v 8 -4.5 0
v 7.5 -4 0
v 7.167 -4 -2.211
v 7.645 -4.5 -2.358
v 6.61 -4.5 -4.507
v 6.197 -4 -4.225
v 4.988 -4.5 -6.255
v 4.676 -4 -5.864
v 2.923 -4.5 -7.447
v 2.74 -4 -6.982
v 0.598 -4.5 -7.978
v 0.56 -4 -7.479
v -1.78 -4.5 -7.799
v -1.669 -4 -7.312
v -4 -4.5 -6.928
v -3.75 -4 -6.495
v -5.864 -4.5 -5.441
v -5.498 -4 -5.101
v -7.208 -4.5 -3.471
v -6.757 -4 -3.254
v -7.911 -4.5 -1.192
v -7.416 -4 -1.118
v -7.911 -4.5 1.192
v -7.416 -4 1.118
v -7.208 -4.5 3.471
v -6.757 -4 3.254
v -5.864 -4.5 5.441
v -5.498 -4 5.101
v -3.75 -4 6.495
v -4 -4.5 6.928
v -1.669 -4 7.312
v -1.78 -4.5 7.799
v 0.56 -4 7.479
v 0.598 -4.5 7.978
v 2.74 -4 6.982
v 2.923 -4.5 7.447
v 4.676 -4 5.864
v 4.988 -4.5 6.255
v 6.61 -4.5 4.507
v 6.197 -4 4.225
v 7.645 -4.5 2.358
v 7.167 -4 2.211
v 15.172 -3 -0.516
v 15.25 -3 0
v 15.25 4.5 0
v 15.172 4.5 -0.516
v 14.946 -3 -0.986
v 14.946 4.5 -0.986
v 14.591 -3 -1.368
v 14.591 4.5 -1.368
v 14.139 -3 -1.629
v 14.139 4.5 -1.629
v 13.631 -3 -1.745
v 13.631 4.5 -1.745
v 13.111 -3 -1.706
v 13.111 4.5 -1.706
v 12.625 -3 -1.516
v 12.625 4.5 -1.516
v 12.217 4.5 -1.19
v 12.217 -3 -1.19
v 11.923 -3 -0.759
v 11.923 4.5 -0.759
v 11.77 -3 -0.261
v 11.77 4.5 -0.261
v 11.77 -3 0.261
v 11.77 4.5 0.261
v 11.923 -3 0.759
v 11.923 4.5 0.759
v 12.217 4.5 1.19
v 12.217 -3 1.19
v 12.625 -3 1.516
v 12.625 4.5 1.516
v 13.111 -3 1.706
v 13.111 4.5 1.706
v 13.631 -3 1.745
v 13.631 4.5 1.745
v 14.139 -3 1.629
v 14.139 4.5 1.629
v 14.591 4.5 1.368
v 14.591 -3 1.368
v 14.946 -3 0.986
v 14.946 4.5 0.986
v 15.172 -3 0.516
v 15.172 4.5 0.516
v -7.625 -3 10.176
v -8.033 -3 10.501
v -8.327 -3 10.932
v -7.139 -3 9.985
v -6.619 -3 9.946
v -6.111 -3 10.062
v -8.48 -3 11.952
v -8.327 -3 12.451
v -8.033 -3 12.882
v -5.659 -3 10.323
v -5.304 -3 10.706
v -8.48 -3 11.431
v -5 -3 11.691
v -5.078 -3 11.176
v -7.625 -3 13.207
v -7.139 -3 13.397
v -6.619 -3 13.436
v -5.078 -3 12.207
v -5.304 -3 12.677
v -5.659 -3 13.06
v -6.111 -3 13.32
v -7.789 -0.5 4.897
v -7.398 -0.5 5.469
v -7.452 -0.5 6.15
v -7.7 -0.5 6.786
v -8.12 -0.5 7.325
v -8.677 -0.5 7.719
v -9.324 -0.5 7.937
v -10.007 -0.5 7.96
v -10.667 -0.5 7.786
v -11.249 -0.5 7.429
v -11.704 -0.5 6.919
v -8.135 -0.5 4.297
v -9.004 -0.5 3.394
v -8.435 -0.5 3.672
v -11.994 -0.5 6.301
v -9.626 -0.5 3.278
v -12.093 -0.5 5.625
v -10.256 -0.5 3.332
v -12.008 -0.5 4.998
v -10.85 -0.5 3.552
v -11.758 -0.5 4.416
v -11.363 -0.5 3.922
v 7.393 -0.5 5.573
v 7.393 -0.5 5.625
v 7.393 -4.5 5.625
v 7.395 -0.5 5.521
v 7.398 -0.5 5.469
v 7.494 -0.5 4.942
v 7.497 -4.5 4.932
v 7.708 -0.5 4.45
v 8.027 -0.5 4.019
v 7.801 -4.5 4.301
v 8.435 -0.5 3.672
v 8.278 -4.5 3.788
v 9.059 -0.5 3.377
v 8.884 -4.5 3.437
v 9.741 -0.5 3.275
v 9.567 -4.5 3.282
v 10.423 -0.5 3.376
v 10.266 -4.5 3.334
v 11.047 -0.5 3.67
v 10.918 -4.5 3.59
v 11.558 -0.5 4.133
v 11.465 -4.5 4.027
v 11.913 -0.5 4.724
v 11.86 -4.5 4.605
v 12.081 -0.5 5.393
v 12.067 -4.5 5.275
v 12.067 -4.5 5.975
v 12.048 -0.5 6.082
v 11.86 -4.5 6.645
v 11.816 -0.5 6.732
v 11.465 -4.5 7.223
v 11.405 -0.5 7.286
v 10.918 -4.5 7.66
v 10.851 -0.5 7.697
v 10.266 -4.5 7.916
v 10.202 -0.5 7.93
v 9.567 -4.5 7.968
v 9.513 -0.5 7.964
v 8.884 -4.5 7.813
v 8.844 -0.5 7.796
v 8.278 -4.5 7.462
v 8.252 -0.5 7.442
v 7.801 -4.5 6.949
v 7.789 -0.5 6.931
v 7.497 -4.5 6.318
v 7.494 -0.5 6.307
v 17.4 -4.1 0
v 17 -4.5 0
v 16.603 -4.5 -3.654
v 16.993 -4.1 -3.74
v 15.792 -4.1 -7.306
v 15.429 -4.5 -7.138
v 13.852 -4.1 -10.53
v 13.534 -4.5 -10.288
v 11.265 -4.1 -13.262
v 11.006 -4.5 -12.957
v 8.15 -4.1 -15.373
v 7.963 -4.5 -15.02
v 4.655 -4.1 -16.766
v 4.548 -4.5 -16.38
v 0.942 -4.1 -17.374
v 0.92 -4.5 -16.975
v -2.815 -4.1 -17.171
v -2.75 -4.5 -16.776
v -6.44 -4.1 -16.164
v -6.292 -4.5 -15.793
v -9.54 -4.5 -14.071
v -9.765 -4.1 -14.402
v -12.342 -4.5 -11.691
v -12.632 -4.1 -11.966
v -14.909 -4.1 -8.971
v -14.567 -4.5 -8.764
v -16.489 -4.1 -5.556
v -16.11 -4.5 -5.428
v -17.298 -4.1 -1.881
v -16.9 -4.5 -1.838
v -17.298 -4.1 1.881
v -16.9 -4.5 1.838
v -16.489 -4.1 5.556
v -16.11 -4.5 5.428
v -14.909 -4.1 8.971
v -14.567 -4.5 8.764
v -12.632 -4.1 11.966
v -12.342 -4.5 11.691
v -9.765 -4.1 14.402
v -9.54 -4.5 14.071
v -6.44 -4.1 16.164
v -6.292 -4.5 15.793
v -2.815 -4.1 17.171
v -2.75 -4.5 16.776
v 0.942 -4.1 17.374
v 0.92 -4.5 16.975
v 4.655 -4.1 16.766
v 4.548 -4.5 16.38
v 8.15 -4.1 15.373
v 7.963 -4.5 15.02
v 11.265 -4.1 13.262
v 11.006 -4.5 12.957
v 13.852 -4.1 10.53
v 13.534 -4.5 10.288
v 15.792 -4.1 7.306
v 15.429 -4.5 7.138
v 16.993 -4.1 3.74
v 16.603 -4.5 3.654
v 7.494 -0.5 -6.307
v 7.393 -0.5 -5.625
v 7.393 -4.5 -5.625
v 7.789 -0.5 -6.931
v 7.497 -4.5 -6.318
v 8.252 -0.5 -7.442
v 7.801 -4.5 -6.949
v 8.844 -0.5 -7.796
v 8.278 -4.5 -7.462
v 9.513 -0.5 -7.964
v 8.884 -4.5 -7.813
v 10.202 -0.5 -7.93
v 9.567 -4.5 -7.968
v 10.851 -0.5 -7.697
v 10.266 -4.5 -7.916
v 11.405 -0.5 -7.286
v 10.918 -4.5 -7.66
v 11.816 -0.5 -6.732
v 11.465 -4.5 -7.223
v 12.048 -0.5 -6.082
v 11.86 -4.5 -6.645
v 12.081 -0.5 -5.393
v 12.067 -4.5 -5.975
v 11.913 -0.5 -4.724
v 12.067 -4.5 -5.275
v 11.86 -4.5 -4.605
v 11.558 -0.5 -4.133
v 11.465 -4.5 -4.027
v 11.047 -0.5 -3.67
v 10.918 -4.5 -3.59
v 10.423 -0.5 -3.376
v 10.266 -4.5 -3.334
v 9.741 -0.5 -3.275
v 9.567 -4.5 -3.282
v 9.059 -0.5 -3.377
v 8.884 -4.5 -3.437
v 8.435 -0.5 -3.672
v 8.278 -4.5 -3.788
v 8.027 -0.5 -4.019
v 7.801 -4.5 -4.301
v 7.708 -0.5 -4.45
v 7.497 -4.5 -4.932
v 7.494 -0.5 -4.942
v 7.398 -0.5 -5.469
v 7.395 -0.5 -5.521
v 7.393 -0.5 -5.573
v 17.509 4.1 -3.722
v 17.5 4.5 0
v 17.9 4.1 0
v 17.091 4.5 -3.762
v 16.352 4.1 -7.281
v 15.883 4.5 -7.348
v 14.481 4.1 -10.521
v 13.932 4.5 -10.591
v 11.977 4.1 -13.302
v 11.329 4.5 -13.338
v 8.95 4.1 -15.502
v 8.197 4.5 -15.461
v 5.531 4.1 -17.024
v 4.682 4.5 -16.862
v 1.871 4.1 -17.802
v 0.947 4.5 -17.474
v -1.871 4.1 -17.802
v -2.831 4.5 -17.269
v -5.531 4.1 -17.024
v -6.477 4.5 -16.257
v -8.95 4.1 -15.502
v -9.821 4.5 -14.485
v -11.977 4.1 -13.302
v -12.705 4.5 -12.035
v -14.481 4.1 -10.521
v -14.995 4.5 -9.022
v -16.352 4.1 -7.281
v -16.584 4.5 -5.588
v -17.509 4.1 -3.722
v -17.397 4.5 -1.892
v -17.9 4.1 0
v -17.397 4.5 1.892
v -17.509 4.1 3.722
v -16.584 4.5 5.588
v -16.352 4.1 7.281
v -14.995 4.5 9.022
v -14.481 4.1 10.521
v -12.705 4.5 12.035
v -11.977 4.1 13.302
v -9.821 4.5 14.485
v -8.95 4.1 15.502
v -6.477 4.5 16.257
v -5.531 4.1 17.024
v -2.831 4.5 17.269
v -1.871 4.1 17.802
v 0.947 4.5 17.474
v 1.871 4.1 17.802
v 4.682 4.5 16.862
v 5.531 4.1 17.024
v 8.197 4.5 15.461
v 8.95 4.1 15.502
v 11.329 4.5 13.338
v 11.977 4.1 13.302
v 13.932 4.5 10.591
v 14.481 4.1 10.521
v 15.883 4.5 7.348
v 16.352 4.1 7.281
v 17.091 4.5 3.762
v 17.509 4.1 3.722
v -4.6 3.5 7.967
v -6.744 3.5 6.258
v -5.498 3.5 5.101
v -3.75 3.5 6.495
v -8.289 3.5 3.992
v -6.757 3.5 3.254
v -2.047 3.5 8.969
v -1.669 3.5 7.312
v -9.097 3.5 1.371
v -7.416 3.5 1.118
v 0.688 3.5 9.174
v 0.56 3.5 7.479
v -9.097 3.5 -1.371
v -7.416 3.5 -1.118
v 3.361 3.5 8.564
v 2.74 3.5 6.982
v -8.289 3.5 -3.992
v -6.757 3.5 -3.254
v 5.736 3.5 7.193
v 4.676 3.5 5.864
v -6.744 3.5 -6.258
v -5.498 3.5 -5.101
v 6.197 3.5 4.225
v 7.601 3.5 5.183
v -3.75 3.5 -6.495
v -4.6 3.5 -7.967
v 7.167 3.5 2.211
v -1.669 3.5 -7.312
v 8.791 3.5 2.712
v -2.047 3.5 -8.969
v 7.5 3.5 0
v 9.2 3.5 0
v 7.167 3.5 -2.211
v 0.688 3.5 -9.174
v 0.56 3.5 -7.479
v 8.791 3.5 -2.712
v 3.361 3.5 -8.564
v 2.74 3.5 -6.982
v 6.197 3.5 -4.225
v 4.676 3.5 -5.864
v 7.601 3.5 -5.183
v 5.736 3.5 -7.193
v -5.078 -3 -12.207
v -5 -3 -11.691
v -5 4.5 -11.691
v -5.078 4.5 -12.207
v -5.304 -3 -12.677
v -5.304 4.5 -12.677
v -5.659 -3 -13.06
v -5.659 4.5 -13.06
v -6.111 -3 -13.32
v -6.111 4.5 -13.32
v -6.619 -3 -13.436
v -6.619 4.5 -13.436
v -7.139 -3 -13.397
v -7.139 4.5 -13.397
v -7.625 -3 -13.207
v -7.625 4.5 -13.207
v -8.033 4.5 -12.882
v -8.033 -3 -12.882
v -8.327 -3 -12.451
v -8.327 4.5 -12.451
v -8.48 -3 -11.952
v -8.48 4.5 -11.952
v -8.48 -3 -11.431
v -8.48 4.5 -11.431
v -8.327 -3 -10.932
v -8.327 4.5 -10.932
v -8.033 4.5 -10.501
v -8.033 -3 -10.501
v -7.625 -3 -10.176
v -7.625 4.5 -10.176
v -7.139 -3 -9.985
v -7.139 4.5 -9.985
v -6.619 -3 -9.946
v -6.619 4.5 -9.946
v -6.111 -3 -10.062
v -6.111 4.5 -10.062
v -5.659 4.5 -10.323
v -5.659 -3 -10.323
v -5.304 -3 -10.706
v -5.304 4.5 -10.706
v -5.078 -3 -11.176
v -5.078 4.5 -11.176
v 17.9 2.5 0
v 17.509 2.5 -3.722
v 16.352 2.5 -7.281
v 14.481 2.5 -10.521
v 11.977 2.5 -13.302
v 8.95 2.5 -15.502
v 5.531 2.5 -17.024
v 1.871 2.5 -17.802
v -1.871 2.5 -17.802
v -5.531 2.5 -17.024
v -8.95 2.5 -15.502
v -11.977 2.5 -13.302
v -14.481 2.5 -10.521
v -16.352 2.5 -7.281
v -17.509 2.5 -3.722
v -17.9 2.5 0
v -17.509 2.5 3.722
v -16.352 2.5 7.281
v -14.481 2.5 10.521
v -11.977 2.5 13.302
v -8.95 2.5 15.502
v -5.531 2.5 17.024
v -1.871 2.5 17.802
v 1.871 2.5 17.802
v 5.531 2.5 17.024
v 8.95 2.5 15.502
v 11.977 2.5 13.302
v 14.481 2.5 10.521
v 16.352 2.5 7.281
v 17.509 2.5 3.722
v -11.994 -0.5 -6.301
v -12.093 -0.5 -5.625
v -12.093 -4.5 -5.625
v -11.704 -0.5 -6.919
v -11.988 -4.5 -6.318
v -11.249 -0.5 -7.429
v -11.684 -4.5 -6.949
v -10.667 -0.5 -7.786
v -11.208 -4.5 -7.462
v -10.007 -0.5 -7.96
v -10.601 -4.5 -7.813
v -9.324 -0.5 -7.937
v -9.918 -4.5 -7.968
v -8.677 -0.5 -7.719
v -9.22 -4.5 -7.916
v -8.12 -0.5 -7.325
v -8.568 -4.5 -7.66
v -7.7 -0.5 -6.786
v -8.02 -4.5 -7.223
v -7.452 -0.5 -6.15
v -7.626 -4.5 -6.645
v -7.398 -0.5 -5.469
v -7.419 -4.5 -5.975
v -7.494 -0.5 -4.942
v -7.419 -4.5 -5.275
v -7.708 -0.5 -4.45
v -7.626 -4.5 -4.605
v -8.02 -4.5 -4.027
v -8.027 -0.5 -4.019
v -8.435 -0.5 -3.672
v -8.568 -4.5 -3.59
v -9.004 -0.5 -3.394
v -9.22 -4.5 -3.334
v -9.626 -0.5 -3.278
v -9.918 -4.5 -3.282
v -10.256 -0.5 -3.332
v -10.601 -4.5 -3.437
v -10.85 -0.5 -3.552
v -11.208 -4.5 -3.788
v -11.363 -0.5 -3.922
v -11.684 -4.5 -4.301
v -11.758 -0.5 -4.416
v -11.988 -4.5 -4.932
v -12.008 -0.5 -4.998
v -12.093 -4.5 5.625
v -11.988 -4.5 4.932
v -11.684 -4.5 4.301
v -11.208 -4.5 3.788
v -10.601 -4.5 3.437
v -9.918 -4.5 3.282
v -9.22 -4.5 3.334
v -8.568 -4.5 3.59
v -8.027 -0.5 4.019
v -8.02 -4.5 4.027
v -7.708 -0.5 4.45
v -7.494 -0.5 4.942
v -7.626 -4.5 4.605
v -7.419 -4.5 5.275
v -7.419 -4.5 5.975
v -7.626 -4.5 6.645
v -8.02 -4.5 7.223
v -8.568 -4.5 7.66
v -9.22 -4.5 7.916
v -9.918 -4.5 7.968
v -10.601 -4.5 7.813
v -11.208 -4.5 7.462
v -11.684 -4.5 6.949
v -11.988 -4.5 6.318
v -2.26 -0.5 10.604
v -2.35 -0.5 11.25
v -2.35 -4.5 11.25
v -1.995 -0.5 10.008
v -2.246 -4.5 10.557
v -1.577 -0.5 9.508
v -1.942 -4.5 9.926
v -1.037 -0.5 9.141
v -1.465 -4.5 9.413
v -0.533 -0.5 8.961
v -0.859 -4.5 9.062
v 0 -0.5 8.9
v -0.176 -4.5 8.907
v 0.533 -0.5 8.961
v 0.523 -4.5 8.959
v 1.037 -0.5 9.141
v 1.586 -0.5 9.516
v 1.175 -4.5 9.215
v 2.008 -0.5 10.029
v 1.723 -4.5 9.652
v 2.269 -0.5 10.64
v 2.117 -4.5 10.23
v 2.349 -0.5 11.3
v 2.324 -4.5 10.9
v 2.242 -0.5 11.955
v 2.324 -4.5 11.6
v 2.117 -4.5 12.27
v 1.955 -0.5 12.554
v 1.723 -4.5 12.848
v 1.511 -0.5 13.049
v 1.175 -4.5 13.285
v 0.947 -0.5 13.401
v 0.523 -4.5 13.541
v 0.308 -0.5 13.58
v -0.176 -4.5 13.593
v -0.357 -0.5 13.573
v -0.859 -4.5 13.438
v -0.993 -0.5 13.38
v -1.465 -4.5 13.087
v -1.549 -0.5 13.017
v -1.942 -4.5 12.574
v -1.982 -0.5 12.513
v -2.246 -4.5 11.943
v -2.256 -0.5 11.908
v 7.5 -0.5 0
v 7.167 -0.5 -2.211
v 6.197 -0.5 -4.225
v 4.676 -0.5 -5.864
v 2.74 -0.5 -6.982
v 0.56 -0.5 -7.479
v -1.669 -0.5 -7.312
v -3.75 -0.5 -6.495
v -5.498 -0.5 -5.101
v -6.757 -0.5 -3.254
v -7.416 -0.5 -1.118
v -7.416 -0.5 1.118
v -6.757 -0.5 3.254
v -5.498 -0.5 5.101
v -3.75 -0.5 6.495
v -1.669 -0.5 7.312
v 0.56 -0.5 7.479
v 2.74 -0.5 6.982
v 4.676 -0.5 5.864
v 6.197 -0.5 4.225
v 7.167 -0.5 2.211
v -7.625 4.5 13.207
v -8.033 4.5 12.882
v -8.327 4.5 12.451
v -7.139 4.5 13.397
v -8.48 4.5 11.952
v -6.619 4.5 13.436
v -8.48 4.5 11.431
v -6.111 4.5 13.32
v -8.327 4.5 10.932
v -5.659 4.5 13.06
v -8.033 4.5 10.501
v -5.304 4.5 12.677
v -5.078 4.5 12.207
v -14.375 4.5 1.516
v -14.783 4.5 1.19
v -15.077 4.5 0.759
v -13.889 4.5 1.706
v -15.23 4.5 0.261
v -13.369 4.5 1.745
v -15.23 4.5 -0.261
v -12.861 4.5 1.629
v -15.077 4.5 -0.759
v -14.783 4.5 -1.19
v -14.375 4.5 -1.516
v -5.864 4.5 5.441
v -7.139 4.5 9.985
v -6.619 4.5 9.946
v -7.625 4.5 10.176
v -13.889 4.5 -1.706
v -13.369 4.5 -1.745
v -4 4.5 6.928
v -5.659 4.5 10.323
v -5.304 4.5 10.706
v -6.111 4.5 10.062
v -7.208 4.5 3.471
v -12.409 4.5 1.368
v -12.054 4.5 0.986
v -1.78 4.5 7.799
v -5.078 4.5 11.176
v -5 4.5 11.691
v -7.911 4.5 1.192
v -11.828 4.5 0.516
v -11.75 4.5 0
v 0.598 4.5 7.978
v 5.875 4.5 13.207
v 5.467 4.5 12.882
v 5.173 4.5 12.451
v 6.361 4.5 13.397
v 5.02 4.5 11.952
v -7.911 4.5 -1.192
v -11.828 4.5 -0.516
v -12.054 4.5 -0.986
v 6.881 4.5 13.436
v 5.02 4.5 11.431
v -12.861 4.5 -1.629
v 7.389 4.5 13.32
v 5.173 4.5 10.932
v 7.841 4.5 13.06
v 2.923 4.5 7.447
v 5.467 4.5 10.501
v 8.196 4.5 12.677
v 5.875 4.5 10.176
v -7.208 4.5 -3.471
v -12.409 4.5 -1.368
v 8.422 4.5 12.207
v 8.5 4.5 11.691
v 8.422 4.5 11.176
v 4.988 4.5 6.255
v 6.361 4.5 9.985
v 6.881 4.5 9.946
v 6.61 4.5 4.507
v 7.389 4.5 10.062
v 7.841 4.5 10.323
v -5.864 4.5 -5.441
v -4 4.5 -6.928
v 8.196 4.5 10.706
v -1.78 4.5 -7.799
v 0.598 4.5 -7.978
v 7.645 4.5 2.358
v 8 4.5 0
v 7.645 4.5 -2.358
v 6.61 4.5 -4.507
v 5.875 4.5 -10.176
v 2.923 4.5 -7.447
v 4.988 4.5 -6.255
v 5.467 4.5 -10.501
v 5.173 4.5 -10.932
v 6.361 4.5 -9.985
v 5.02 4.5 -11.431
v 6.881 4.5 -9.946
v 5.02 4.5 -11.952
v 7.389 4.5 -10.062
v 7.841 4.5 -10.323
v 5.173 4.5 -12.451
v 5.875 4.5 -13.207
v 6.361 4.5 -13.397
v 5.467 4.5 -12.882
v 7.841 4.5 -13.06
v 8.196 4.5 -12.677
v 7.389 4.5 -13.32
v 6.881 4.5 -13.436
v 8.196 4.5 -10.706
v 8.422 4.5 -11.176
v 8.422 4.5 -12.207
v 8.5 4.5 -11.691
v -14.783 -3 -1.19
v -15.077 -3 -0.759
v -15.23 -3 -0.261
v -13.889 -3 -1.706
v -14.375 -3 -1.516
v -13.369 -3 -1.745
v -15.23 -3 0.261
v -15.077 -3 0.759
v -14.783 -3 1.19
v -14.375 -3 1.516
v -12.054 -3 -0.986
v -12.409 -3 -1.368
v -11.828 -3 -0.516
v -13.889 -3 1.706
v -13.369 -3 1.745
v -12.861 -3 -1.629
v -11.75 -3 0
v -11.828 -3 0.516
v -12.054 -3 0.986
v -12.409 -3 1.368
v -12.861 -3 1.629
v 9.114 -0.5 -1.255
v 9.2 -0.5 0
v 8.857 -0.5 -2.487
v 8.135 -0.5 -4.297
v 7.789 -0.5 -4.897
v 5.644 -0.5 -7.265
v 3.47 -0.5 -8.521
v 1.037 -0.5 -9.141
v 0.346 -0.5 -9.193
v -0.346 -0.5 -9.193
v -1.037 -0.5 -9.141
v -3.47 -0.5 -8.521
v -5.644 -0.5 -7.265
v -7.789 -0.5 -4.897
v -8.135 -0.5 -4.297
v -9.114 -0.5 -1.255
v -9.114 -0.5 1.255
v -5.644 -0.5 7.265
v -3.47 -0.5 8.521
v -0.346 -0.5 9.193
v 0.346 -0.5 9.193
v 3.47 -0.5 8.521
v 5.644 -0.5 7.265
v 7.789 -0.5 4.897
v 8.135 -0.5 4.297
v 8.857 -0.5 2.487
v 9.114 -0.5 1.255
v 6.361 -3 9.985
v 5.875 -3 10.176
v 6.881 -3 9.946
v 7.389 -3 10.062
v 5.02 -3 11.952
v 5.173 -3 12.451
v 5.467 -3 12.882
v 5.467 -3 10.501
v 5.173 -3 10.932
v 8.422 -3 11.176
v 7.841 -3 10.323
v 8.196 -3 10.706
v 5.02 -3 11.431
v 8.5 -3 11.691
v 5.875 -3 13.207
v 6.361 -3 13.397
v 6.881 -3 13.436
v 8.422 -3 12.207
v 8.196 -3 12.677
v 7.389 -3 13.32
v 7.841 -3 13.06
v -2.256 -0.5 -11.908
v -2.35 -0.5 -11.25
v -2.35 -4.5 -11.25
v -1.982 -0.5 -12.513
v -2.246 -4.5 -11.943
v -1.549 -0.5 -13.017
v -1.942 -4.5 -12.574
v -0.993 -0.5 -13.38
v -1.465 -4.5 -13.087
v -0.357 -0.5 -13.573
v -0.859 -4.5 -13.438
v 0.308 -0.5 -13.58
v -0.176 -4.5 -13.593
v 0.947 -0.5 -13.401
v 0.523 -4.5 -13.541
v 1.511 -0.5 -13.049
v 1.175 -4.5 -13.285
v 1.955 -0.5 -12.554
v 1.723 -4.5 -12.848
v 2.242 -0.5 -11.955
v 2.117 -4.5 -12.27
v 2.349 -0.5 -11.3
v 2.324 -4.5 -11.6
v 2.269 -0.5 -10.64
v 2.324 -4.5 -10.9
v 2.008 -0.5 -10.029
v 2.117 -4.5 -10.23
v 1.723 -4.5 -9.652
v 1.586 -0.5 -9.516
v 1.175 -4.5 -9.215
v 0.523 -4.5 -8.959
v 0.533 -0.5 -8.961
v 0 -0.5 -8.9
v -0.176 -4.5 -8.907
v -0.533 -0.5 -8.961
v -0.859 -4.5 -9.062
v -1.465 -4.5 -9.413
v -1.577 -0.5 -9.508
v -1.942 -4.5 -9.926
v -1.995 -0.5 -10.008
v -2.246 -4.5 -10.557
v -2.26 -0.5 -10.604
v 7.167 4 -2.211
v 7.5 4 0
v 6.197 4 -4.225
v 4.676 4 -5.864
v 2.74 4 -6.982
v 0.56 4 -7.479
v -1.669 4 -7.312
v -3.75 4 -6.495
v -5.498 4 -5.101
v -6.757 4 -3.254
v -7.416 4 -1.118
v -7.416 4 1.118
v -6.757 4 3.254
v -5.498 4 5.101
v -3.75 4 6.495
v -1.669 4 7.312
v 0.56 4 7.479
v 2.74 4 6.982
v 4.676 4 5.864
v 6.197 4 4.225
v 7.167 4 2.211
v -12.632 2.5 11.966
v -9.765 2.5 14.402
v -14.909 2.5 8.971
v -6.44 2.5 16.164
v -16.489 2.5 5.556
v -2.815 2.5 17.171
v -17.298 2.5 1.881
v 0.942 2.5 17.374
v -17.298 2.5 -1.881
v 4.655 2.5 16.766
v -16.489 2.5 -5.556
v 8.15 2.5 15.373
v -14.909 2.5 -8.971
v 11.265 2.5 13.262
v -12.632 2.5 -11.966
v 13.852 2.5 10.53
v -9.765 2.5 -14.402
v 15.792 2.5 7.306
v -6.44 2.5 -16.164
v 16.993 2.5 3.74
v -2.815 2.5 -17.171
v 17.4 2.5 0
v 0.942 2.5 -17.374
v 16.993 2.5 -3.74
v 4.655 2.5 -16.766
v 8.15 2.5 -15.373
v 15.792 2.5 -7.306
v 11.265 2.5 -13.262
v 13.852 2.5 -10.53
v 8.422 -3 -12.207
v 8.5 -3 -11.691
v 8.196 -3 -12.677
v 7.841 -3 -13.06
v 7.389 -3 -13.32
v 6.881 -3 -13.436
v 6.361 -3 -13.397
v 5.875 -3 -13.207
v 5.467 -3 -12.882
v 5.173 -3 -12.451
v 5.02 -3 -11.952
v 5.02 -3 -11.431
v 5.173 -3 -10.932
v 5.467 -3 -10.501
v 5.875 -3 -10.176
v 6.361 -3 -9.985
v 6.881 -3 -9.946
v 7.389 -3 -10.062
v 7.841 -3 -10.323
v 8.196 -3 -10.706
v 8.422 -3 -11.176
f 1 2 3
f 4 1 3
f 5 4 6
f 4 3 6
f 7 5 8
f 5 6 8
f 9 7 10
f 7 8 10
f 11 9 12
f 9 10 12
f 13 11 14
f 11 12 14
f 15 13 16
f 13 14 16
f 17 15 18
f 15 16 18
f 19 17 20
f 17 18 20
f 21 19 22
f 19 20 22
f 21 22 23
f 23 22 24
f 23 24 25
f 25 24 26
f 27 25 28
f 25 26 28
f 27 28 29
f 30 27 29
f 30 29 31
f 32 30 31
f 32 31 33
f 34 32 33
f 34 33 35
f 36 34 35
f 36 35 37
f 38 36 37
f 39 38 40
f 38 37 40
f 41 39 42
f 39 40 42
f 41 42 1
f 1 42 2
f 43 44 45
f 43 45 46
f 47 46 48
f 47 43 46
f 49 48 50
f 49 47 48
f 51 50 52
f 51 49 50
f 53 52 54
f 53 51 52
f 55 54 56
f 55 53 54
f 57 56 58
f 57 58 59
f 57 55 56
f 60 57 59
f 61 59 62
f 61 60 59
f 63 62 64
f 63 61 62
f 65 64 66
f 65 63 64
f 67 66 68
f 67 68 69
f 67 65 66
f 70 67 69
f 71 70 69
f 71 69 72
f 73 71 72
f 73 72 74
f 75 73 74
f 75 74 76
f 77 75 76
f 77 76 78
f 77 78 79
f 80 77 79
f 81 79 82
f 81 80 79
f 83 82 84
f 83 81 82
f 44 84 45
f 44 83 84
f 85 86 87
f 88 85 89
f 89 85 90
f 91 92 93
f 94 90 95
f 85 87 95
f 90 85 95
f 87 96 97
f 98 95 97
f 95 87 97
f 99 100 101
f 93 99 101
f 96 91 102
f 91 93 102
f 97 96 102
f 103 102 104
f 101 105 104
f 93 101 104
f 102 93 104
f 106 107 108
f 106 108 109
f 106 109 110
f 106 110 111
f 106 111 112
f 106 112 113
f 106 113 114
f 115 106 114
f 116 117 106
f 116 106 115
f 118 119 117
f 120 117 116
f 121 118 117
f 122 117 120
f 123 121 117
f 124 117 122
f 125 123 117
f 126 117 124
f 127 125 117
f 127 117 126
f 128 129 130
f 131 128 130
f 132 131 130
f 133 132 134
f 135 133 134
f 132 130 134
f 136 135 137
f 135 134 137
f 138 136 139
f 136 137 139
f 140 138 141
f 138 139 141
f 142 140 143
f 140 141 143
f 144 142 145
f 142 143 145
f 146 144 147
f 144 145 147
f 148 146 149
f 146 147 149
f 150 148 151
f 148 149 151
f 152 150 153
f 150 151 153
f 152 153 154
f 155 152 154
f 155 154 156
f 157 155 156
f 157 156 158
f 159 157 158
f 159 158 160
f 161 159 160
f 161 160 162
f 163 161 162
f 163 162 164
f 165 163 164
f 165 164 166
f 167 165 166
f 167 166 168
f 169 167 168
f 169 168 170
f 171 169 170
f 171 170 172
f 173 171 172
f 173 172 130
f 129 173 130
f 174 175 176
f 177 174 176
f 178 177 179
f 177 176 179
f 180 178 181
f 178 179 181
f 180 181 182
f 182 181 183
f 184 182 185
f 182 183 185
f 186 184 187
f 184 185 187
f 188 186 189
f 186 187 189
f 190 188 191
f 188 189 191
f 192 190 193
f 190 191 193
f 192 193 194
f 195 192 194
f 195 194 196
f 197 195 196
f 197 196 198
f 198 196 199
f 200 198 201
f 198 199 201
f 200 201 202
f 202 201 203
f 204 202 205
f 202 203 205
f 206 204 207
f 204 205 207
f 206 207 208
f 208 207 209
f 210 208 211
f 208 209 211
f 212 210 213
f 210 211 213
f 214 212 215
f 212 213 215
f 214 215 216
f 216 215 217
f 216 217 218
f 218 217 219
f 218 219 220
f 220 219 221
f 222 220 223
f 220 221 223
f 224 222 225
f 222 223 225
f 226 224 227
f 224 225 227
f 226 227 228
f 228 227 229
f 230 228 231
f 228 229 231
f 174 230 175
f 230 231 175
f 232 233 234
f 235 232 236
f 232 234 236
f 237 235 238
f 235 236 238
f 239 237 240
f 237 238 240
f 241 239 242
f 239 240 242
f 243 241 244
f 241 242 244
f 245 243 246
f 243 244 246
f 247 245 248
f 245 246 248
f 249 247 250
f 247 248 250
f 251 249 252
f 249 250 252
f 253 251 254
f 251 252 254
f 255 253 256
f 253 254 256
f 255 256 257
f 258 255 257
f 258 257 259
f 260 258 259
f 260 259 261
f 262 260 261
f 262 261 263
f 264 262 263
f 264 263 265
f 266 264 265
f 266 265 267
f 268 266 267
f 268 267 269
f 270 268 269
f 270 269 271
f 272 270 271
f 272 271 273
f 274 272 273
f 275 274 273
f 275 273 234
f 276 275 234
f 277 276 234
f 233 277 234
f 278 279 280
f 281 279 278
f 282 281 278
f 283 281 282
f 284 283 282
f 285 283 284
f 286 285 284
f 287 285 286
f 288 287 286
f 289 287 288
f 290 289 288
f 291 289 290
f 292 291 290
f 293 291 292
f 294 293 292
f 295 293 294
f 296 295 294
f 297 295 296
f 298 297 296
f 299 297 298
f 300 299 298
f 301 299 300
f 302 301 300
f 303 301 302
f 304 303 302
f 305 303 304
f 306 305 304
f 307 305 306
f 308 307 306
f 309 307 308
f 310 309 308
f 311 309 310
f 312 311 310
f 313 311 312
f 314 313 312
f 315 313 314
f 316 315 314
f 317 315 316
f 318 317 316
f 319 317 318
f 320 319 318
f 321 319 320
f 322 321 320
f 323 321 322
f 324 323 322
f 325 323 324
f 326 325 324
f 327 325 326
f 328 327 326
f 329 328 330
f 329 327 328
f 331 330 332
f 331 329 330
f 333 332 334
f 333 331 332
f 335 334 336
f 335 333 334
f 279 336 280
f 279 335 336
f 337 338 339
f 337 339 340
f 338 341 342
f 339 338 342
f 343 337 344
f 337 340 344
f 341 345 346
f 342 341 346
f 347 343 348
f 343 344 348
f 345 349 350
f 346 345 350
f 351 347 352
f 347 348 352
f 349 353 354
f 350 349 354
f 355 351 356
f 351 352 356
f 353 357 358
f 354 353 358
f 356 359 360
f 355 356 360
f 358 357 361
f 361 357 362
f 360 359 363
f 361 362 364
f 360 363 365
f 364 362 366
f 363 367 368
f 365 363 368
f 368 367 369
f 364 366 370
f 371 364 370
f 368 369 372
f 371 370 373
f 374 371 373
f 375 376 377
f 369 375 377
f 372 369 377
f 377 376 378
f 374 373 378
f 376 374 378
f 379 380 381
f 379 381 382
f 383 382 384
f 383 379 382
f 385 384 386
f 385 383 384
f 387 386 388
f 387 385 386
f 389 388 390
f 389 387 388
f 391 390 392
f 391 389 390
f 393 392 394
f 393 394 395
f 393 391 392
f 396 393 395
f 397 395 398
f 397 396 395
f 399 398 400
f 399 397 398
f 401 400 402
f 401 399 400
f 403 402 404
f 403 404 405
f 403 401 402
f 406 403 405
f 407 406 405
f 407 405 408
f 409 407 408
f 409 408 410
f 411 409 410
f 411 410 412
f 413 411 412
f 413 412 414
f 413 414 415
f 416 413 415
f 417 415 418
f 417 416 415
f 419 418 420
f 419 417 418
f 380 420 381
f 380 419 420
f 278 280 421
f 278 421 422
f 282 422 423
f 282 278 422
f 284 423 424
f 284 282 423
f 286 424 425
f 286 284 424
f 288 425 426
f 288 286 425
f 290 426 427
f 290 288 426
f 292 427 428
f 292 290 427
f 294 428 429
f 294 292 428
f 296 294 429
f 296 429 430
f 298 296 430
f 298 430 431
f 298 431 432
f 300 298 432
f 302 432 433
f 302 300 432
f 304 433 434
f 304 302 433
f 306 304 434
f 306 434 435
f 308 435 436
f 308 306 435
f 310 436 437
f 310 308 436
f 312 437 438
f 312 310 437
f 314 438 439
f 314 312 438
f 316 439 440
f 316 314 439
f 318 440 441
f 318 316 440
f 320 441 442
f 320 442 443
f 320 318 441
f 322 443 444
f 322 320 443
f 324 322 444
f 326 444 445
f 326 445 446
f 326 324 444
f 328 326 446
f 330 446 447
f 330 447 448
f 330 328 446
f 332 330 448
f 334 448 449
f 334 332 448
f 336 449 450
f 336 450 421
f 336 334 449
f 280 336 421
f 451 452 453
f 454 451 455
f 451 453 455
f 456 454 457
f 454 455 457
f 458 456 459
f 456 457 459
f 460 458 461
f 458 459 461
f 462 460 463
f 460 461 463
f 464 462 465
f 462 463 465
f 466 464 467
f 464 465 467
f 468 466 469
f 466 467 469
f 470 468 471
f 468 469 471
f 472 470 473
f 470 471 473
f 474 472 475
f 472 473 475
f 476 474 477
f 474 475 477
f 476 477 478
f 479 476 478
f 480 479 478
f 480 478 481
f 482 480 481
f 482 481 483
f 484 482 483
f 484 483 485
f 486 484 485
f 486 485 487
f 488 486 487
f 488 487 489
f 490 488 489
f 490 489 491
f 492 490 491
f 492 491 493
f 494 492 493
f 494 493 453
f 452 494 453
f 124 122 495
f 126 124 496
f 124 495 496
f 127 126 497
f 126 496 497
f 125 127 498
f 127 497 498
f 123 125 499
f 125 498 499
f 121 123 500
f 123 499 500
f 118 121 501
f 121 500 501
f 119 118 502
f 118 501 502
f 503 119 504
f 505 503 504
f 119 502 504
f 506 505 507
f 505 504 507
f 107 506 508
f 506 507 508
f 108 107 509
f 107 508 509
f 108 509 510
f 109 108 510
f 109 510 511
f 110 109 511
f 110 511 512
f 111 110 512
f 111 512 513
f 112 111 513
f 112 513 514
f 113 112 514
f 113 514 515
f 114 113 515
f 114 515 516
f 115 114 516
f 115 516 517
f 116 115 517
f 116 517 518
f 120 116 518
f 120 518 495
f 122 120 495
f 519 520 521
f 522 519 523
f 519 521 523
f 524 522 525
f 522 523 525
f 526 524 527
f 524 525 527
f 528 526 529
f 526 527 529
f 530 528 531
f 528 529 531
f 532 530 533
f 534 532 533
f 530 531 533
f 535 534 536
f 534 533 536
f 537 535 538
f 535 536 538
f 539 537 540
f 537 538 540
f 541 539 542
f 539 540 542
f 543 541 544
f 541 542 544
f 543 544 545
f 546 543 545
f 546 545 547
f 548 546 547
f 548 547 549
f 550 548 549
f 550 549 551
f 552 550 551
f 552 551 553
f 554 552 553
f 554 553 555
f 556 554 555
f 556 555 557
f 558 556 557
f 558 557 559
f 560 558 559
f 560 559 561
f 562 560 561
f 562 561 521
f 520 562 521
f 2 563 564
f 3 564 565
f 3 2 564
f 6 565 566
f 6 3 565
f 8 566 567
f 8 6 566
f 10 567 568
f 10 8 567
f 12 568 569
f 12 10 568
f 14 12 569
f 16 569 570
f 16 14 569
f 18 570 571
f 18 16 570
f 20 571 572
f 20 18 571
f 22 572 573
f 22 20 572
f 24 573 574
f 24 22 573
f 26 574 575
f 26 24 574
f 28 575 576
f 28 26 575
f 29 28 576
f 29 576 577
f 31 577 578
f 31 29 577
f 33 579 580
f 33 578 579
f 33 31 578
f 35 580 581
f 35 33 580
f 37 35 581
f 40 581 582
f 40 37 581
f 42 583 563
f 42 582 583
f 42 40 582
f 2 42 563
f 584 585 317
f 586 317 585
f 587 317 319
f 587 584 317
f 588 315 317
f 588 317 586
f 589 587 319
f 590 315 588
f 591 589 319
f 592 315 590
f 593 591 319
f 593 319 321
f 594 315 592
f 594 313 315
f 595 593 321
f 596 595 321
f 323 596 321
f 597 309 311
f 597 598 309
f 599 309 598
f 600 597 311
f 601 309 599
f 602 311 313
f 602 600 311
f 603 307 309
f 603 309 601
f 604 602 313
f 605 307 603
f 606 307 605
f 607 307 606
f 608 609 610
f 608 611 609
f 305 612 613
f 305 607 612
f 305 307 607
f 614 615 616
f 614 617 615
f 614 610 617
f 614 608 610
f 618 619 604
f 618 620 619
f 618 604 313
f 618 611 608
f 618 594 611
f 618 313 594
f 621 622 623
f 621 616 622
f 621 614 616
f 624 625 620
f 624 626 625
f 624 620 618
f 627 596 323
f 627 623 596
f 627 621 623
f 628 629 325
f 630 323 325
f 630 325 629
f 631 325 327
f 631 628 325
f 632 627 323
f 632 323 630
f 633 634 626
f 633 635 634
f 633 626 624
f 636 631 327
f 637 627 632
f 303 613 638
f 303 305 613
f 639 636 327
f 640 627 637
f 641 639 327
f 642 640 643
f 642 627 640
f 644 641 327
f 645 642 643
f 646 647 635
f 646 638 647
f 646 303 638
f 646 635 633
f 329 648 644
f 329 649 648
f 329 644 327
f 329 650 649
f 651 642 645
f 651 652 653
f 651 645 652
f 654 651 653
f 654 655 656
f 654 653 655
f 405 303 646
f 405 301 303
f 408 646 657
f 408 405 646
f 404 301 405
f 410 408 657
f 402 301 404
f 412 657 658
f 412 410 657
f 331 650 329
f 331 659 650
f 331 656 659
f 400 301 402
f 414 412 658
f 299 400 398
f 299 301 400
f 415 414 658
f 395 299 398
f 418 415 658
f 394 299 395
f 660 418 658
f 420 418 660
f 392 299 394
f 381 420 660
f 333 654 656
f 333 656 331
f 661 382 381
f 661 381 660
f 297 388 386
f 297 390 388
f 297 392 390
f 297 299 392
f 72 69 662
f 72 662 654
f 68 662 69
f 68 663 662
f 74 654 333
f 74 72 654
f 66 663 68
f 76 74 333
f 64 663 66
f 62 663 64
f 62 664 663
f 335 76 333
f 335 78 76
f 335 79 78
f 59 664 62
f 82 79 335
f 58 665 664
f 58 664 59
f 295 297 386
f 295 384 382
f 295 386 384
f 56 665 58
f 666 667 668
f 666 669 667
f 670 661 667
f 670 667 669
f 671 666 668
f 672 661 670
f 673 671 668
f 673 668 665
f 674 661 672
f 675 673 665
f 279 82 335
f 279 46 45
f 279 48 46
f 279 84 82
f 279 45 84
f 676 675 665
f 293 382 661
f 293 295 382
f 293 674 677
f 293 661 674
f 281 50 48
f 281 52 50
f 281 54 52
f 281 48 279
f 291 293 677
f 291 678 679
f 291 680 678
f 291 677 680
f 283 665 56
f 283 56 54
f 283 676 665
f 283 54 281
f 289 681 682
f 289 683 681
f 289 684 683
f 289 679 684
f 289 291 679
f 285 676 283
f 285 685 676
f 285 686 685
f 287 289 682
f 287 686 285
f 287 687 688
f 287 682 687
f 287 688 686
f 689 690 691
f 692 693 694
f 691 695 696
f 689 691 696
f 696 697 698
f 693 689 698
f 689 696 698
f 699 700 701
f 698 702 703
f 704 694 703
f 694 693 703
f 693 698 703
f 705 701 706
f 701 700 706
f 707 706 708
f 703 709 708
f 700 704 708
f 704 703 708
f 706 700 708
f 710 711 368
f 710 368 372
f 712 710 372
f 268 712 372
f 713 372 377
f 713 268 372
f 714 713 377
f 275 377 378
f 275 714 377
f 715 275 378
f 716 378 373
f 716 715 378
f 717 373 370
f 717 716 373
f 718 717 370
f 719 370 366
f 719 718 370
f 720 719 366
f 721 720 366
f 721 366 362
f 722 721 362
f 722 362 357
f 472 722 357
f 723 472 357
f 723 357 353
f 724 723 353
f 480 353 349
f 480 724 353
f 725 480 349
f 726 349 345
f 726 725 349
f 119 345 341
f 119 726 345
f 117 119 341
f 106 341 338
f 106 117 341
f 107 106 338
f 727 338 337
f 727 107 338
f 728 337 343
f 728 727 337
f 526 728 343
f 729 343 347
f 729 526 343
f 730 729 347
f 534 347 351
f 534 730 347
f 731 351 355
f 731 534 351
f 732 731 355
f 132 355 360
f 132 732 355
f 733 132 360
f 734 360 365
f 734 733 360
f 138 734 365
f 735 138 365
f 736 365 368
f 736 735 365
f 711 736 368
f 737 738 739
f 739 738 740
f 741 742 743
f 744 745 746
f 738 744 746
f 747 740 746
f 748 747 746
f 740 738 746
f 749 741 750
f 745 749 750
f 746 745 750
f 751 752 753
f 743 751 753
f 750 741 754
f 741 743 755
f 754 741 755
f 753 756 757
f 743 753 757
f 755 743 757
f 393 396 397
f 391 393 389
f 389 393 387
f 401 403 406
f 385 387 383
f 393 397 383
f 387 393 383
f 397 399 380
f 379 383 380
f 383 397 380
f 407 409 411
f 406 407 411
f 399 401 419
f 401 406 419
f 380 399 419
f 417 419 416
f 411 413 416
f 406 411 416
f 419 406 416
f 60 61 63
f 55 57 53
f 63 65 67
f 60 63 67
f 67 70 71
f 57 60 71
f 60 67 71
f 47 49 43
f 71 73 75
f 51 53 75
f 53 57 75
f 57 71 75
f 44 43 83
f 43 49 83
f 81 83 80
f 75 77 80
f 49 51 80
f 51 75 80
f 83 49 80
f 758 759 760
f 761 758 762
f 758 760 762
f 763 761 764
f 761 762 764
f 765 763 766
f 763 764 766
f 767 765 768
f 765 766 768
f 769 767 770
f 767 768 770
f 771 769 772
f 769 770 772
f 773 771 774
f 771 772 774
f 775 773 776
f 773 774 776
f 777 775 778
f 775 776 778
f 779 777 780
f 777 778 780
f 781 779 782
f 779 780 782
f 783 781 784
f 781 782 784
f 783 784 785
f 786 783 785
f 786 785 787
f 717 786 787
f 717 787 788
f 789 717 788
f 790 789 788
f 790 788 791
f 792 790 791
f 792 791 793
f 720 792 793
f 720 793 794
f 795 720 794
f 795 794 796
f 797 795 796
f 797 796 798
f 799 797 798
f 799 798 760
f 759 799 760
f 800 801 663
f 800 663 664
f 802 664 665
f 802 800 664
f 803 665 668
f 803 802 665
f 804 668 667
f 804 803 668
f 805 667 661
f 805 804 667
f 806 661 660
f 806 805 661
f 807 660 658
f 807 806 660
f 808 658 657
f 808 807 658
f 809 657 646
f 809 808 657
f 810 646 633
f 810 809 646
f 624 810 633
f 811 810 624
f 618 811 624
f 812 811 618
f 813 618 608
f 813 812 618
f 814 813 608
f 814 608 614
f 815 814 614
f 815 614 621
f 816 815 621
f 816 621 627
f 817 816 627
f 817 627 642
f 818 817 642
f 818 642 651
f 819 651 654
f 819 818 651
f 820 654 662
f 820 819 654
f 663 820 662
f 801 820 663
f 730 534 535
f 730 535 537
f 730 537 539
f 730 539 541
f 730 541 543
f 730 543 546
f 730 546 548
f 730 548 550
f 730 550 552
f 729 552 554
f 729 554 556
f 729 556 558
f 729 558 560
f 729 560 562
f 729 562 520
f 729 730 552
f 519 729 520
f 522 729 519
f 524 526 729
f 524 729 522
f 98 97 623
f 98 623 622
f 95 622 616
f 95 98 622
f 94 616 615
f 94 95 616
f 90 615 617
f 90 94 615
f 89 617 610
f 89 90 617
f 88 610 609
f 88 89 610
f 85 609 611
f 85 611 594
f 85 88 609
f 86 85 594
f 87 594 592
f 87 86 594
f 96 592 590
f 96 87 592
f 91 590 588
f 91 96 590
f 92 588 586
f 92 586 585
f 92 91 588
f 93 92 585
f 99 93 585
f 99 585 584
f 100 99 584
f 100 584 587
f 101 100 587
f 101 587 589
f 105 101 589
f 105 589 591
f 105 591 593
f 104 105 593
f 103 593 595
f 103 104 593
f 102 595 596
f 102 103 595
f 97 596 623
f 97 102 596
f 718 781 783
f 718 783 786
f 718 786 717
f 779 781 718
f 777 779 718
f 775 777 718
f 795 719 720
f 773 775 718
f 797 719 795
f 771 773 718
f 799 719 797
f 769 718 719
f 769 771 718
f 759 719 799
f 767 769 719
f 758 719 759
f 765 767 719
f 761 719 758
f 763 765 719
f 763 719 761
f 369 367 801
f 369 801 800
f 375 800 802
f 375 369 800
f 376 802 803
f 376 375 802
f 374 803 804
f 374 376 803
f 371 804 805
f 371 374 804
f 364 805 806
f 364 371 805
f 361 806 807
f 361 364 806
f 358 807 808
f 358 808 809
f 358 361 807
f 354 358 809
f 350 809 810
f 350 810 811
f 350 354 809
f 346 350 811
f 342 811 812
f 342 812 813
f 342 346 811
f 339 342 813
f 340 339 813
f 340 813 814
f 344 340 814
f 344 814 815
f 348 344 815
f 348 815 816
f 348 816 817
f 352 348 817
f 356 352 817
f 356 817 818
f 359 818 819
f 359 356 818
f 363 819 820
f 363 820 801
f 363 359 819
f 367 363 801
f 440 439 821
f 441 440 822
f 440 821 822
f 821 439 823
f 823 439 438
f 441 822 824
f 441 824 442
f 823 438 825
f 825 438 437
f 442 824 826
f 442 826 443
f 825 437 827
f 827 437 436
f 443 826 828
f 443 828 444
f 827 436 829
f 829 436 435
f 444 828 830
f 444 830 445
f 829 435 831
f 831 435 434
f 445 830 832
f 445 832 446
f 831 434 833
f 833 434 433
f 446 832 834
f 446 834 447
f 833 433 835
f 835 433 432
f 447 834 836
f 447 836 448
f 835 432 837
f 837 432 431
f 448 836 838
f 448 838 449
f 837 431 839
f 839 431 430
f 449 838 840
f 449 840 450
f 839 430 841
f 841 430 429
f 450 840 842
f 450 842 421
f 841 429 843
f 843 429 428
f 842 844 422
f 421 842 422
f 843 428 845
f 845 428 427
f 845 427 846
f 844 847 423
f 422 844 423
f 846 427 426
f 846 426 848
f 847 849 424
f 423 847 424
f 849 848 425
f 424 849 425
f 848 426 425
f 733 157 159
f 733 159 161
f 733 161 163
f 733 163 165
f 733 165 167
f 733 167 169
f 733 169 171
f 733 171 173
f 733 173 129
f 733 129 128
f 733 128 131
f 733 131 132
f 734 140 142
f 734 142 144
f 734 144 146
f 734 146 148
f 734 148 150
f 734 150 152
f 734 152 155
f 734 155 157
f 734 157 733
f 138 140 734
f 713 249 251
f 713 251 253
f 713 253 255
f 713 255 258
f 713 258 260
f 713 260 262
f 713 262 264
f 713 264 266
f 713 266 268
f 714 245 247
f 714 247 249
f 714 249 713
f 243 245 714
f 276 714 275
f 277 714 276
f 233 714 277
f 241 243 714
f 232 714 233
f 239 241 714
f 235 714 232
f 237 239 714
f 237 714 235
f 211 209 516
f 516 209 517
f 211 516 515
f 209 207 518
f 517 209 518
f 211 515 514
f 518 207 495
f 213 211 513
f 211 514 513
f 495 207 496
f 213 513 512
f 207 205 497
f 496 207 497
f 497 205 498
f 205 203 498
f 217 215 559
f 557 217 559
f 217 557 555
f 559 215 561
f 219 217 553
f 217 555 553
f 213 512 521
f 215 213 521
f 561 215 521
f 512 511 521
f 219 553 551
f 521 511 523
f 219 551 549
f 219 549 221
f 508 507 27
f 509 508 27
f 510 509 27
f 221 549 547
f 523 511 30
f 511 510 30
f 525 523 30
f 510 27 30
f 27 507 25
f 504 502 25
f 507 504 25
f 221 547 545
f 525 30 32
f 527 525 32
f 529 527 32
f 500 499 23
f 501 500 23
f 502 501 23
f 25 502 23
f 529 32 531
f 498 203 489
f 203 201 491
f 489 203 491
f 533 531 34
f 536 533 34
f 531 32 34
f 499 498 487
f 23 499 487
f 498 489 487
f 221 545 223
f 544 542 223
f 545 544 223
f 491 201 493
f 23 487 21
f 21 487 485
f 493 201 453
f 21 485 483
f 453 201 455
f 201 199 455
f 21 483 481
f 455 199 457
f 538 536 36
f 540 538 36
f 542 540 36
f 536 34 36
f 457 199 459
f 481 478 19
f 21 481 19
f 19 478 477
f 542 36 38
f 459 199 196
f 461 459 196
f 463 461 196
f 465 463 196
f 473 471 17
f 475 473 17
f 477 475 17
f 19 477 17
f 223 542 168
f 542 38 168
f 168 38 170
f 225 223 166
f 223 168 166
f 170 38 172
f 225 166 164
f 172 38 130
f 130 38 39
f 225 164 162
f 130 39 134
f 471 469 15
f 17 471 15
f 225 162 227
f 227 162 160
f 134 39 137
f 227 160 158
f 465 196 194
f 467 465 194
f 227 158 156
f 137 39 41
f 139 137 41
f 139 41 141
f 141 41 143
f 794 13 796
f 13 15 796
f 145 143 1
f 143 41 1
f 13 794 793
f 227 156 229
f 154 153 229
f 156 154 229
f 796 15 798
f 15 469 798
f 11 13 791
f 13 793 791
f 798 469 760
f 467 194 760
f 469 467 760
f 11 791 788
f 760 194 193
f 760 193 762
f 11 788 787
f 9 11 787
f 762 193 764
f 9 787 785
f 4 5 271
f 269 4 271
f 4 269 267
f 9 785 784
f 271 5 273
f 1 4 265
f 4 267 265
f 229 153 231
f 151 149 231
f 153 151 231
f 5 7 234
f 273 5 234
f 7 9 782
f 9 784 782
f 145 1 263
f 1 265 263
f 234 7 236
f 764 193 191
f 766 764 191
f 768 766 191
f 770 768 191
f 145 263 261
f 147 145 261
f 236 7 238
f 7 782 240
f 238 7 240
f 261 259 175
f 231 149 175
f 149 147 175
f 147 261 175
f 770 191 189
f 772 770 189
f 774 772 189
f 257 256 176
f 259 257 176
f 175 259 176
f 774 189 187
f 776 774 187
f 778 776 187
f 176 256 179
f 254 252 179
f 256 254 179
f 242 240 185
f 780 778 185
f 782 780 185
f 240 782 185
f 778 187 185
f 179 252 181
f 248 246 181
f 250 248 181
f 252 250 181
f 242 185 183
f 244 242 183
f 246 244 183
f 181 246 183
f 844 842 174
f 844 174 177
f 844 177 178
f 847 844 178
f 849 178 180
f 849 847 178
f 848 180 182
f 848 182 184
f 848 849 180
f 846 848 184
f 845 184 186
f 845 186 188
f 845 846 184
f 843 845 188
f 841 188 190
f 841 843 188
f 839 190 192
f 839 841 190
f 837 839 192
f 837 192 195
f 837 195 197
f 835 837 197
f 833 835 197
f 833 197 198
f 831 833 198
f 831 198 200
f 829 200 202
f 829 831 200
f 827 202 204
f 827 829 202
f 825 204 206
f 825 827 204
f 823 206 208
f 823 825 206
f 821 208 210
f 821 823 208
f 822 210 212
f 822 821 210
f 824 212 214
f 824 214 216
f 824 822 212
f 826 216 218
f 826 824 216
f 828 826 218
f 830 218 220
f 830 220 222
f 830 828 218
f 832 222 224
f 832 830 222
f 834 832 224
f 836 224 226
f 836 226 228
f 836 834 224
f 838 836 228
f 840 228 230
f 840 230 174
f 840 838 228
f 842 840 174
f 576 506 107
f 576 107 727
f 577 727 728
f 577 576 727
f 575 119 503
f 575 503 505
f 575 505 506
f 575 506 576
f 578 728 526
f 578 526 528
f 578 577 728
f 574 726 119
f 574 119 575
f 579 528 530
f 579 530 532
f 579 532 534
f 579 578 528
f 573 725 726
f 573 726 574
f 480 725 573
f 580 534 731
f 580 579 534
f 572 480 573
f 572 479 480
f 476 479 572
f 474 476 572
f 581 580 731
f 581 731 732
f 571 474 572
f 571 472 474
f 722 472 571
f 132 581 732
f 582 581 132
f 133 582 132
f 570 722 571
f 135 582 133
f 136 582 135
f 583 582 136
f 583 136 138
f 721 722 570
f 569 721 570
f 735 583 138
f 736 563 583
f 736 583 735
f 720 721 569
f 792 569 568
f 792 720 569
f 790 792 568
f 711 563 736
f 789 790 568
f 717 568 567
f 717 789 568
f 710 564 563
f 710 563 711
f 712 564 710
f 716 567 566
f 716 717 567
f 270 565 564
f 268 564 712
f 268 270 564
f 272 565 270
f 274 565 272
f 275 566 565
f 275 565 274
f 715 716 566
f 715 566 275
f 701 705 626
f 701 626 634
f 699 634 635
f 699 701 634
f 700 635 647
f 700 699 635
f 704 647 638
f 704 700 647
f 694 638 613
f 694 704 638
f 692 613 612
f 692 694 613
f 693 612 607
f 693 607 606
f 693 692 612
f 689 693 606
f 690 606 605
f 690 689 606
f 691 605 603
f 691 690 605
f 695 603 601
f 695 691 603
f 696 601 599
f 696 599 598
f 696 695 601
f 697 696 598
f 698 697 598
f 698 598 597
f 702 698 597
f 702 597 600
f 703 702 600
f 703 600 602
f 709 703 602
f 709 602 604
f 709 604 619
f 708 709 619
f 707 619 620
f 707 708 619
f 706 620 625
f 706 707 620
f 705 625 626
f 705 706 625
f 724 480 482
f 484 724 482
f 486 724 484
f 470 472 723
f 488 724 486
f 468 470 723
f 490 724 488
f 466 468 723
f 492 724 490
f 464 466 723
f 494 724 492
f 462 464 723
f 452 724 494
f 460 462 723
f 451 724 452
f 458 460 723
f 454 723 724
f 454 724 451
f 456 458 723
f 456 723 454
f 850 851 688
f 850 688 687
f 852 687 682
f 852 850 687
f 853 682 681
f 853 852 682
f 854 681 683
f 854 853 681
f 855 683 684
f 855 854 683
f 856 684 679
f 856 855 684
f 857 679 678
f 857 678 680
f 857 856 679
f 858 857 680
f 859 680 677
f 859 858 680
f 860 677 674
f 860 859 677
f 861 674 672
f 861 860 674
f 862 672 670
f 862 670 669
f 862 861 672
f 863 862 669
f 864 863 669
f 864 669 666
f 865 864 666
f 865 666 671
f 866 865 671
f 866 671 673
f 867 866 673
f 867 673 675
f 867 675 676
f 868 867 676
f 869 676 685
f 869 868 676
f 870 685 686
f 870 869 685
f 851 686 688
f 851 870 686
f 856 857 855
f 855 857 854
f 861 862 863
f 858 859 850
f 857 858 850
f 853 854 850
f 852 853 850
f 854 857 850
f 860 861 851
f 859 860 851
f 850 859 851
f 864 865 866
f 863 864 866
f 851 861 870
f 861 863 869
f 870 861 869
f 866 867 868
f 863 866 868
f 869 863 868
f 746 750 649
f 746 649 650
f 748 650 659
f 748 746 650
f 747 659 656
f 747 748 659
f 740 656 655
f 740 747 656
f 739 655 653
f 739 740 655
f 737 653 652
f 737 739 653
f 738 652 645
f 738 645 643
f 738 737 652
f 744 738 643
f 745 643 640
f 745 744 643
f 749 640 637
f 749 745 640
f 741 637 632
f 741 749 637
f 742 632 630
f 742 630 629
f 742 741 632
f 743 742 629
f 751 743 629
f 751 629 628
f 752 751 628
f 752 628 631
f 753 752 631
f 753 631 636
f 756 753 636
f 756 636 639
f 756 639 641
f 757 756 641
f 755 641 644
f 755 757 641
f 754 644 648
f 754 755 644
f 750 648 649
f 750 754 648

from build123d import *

# Parameters (mm, degrees)
SKETCH1_R           = 17.4
SKETCH1_R_2         = 1.75
SKETCH1_R_3         = 7.5
BOSS_EXTRUDE1_DEPTH = 4.5
CUT_EXTRUDE1_START  = -0.5
SKETCH2_R           = 9.2
CUT_EXTRUDE1_DEPTH  = 4
SKETCH3_R           = 15.25
SKETCH3_R_2         = 11.75
BOSS_EXTRUDE2_DEPTH = 1.5
CHAMFER1_SIZE       = 0.5
SKETCH4_R           = 17.9
SKETCH4_R_2         = 17.4
BOSS_EXTRUDE3_DEPTH = 2
SKETCH5_R           = 2.35
CUT_EXTRUDE2_DEPTH  = 4
CHAMFER3_SIZE       = 0.4


with BuildPart() as part:
    # Sketch1 → Boss-Extrude1 (new body, symmetric)
    with BuildSketch(Plane(origin=(0, 0, 0), x_dir=(1, 0, 0), z_dir=(0, 1, 0))):
        Circle(SKETCH1_R)
        with Locations((13.5, 0)):
            Circle(SKETCH1_R_2, mode=Mode.SUBTRACT)
        with Locations((6.75, -11.691342951)):
            Circle(SKETCH1_R_2, mode=Mode.SUBTRACT)
        with Locations((-6.75, -11.691342951)):
            Circle(SKETCH1_R_2, mode=Mode.SUBTRACT)
        with Locations((-13.5, 0)):
            Circle(SKETCH1_R_2, mode=Mode.SUBTRACT)
        with Locations((-6.75, 11.691342951)):
            Circle(SKETCH1_R_2, mode=Mode.SUBTRACT)
        with Locations((6.75, 11.691342951)):
            Circle(SKETCH1_R_2, mode=Mode.SUBTRACT)
        Circle(SKETCH1_R_3, mode=Mode.SUBTRACT)
    extrude(amount=BOSS_EXTRUDE1_DEPTH, both=True)

    # Sketch2 → Cut-Extrude1 (cut)
    with BuildSketch(Plane(origin=(0, 0, 0), x_dir=(1, 0, 0), z_dir=(0, 1, 0)).offset(CUT_EXTRUDE1_START)):
        Circle(SKETCH2_R)
    extrude(amount=CUT_EXTRUDE1_DEPTH, mode=Mode.SUBTRACT)

    # Sketch3 → Boss-Extrude2 (add)
    with BuildSketch(Plane.XZ.offset(4.5)):
        Circle(SKETCH3_R)
        Circle(SKETCH3_R_2, mode=Mode.SUBTRACT)
    extrude(amount=-BOSS_EXTRUDE2_DEPTH)

    # Chamfer1
    chamfer1_edges = [part.edges().sort_by_distance(p)[0] for p in [
        (-7.5, -4.5, 0),
        (-7.5, 4.5, 0),
    ]]
    chamfer(chamfer1_edges, length=CHAMFER1_SIZE)

    # Sketch4 → Boss-Extrude3 (add)
    with BuildSketch(Plane(origin=(0, 4.5, 0), x_dir=(1, 0, 0), z_dir=(0, 1, 0))):
        Circle(SKETCH4_R)
        Circle(SKETCH4_R_2, mode=Mode.SUBTRACT)
    extrude(amount=-BOSS_EXTRUDE3_DEPTH)

    # Sketch5 → Cut-Extrude2 (cut)
    with BuildSketch(Plane(origin=(0, -4.5, 0), x_dir=(-1, 0, 0), z_dir=(0, -1, 0))):
        with Locations((-9.742785793, -5.625)):
            Circle(SKETCH5_R)
        with Locations((-9.742785793, 5.625)):
            Circle(SKETCH5_R)
        with Locations((0, 11.25)):
            Circle(SKETCH5_R)
        with Locations((9.742785793, 5.625)):
            Circle(SKETCH5_R)
        with Locations((9.742785793, -5.625)):
            Circle(SKETCH5_R)
        with Locations((0, -11.25)):
            Circle(SKETCH5_R)
    extrude(amount=-CUT_EXTRUDE2_DEPTH, mode=Mode.SUBTRACT)

    # Chamfer3
    chamfer3_edges = [part.edges().sort_by_distance(p)[0] for p in [
        (-17.9, 4.5, 0),
        (-17.4, -4.5, 0),
    ]]
    chamfer(chamfer3_edges, length=CHAMFER3_SIZE)


solid = part.part
